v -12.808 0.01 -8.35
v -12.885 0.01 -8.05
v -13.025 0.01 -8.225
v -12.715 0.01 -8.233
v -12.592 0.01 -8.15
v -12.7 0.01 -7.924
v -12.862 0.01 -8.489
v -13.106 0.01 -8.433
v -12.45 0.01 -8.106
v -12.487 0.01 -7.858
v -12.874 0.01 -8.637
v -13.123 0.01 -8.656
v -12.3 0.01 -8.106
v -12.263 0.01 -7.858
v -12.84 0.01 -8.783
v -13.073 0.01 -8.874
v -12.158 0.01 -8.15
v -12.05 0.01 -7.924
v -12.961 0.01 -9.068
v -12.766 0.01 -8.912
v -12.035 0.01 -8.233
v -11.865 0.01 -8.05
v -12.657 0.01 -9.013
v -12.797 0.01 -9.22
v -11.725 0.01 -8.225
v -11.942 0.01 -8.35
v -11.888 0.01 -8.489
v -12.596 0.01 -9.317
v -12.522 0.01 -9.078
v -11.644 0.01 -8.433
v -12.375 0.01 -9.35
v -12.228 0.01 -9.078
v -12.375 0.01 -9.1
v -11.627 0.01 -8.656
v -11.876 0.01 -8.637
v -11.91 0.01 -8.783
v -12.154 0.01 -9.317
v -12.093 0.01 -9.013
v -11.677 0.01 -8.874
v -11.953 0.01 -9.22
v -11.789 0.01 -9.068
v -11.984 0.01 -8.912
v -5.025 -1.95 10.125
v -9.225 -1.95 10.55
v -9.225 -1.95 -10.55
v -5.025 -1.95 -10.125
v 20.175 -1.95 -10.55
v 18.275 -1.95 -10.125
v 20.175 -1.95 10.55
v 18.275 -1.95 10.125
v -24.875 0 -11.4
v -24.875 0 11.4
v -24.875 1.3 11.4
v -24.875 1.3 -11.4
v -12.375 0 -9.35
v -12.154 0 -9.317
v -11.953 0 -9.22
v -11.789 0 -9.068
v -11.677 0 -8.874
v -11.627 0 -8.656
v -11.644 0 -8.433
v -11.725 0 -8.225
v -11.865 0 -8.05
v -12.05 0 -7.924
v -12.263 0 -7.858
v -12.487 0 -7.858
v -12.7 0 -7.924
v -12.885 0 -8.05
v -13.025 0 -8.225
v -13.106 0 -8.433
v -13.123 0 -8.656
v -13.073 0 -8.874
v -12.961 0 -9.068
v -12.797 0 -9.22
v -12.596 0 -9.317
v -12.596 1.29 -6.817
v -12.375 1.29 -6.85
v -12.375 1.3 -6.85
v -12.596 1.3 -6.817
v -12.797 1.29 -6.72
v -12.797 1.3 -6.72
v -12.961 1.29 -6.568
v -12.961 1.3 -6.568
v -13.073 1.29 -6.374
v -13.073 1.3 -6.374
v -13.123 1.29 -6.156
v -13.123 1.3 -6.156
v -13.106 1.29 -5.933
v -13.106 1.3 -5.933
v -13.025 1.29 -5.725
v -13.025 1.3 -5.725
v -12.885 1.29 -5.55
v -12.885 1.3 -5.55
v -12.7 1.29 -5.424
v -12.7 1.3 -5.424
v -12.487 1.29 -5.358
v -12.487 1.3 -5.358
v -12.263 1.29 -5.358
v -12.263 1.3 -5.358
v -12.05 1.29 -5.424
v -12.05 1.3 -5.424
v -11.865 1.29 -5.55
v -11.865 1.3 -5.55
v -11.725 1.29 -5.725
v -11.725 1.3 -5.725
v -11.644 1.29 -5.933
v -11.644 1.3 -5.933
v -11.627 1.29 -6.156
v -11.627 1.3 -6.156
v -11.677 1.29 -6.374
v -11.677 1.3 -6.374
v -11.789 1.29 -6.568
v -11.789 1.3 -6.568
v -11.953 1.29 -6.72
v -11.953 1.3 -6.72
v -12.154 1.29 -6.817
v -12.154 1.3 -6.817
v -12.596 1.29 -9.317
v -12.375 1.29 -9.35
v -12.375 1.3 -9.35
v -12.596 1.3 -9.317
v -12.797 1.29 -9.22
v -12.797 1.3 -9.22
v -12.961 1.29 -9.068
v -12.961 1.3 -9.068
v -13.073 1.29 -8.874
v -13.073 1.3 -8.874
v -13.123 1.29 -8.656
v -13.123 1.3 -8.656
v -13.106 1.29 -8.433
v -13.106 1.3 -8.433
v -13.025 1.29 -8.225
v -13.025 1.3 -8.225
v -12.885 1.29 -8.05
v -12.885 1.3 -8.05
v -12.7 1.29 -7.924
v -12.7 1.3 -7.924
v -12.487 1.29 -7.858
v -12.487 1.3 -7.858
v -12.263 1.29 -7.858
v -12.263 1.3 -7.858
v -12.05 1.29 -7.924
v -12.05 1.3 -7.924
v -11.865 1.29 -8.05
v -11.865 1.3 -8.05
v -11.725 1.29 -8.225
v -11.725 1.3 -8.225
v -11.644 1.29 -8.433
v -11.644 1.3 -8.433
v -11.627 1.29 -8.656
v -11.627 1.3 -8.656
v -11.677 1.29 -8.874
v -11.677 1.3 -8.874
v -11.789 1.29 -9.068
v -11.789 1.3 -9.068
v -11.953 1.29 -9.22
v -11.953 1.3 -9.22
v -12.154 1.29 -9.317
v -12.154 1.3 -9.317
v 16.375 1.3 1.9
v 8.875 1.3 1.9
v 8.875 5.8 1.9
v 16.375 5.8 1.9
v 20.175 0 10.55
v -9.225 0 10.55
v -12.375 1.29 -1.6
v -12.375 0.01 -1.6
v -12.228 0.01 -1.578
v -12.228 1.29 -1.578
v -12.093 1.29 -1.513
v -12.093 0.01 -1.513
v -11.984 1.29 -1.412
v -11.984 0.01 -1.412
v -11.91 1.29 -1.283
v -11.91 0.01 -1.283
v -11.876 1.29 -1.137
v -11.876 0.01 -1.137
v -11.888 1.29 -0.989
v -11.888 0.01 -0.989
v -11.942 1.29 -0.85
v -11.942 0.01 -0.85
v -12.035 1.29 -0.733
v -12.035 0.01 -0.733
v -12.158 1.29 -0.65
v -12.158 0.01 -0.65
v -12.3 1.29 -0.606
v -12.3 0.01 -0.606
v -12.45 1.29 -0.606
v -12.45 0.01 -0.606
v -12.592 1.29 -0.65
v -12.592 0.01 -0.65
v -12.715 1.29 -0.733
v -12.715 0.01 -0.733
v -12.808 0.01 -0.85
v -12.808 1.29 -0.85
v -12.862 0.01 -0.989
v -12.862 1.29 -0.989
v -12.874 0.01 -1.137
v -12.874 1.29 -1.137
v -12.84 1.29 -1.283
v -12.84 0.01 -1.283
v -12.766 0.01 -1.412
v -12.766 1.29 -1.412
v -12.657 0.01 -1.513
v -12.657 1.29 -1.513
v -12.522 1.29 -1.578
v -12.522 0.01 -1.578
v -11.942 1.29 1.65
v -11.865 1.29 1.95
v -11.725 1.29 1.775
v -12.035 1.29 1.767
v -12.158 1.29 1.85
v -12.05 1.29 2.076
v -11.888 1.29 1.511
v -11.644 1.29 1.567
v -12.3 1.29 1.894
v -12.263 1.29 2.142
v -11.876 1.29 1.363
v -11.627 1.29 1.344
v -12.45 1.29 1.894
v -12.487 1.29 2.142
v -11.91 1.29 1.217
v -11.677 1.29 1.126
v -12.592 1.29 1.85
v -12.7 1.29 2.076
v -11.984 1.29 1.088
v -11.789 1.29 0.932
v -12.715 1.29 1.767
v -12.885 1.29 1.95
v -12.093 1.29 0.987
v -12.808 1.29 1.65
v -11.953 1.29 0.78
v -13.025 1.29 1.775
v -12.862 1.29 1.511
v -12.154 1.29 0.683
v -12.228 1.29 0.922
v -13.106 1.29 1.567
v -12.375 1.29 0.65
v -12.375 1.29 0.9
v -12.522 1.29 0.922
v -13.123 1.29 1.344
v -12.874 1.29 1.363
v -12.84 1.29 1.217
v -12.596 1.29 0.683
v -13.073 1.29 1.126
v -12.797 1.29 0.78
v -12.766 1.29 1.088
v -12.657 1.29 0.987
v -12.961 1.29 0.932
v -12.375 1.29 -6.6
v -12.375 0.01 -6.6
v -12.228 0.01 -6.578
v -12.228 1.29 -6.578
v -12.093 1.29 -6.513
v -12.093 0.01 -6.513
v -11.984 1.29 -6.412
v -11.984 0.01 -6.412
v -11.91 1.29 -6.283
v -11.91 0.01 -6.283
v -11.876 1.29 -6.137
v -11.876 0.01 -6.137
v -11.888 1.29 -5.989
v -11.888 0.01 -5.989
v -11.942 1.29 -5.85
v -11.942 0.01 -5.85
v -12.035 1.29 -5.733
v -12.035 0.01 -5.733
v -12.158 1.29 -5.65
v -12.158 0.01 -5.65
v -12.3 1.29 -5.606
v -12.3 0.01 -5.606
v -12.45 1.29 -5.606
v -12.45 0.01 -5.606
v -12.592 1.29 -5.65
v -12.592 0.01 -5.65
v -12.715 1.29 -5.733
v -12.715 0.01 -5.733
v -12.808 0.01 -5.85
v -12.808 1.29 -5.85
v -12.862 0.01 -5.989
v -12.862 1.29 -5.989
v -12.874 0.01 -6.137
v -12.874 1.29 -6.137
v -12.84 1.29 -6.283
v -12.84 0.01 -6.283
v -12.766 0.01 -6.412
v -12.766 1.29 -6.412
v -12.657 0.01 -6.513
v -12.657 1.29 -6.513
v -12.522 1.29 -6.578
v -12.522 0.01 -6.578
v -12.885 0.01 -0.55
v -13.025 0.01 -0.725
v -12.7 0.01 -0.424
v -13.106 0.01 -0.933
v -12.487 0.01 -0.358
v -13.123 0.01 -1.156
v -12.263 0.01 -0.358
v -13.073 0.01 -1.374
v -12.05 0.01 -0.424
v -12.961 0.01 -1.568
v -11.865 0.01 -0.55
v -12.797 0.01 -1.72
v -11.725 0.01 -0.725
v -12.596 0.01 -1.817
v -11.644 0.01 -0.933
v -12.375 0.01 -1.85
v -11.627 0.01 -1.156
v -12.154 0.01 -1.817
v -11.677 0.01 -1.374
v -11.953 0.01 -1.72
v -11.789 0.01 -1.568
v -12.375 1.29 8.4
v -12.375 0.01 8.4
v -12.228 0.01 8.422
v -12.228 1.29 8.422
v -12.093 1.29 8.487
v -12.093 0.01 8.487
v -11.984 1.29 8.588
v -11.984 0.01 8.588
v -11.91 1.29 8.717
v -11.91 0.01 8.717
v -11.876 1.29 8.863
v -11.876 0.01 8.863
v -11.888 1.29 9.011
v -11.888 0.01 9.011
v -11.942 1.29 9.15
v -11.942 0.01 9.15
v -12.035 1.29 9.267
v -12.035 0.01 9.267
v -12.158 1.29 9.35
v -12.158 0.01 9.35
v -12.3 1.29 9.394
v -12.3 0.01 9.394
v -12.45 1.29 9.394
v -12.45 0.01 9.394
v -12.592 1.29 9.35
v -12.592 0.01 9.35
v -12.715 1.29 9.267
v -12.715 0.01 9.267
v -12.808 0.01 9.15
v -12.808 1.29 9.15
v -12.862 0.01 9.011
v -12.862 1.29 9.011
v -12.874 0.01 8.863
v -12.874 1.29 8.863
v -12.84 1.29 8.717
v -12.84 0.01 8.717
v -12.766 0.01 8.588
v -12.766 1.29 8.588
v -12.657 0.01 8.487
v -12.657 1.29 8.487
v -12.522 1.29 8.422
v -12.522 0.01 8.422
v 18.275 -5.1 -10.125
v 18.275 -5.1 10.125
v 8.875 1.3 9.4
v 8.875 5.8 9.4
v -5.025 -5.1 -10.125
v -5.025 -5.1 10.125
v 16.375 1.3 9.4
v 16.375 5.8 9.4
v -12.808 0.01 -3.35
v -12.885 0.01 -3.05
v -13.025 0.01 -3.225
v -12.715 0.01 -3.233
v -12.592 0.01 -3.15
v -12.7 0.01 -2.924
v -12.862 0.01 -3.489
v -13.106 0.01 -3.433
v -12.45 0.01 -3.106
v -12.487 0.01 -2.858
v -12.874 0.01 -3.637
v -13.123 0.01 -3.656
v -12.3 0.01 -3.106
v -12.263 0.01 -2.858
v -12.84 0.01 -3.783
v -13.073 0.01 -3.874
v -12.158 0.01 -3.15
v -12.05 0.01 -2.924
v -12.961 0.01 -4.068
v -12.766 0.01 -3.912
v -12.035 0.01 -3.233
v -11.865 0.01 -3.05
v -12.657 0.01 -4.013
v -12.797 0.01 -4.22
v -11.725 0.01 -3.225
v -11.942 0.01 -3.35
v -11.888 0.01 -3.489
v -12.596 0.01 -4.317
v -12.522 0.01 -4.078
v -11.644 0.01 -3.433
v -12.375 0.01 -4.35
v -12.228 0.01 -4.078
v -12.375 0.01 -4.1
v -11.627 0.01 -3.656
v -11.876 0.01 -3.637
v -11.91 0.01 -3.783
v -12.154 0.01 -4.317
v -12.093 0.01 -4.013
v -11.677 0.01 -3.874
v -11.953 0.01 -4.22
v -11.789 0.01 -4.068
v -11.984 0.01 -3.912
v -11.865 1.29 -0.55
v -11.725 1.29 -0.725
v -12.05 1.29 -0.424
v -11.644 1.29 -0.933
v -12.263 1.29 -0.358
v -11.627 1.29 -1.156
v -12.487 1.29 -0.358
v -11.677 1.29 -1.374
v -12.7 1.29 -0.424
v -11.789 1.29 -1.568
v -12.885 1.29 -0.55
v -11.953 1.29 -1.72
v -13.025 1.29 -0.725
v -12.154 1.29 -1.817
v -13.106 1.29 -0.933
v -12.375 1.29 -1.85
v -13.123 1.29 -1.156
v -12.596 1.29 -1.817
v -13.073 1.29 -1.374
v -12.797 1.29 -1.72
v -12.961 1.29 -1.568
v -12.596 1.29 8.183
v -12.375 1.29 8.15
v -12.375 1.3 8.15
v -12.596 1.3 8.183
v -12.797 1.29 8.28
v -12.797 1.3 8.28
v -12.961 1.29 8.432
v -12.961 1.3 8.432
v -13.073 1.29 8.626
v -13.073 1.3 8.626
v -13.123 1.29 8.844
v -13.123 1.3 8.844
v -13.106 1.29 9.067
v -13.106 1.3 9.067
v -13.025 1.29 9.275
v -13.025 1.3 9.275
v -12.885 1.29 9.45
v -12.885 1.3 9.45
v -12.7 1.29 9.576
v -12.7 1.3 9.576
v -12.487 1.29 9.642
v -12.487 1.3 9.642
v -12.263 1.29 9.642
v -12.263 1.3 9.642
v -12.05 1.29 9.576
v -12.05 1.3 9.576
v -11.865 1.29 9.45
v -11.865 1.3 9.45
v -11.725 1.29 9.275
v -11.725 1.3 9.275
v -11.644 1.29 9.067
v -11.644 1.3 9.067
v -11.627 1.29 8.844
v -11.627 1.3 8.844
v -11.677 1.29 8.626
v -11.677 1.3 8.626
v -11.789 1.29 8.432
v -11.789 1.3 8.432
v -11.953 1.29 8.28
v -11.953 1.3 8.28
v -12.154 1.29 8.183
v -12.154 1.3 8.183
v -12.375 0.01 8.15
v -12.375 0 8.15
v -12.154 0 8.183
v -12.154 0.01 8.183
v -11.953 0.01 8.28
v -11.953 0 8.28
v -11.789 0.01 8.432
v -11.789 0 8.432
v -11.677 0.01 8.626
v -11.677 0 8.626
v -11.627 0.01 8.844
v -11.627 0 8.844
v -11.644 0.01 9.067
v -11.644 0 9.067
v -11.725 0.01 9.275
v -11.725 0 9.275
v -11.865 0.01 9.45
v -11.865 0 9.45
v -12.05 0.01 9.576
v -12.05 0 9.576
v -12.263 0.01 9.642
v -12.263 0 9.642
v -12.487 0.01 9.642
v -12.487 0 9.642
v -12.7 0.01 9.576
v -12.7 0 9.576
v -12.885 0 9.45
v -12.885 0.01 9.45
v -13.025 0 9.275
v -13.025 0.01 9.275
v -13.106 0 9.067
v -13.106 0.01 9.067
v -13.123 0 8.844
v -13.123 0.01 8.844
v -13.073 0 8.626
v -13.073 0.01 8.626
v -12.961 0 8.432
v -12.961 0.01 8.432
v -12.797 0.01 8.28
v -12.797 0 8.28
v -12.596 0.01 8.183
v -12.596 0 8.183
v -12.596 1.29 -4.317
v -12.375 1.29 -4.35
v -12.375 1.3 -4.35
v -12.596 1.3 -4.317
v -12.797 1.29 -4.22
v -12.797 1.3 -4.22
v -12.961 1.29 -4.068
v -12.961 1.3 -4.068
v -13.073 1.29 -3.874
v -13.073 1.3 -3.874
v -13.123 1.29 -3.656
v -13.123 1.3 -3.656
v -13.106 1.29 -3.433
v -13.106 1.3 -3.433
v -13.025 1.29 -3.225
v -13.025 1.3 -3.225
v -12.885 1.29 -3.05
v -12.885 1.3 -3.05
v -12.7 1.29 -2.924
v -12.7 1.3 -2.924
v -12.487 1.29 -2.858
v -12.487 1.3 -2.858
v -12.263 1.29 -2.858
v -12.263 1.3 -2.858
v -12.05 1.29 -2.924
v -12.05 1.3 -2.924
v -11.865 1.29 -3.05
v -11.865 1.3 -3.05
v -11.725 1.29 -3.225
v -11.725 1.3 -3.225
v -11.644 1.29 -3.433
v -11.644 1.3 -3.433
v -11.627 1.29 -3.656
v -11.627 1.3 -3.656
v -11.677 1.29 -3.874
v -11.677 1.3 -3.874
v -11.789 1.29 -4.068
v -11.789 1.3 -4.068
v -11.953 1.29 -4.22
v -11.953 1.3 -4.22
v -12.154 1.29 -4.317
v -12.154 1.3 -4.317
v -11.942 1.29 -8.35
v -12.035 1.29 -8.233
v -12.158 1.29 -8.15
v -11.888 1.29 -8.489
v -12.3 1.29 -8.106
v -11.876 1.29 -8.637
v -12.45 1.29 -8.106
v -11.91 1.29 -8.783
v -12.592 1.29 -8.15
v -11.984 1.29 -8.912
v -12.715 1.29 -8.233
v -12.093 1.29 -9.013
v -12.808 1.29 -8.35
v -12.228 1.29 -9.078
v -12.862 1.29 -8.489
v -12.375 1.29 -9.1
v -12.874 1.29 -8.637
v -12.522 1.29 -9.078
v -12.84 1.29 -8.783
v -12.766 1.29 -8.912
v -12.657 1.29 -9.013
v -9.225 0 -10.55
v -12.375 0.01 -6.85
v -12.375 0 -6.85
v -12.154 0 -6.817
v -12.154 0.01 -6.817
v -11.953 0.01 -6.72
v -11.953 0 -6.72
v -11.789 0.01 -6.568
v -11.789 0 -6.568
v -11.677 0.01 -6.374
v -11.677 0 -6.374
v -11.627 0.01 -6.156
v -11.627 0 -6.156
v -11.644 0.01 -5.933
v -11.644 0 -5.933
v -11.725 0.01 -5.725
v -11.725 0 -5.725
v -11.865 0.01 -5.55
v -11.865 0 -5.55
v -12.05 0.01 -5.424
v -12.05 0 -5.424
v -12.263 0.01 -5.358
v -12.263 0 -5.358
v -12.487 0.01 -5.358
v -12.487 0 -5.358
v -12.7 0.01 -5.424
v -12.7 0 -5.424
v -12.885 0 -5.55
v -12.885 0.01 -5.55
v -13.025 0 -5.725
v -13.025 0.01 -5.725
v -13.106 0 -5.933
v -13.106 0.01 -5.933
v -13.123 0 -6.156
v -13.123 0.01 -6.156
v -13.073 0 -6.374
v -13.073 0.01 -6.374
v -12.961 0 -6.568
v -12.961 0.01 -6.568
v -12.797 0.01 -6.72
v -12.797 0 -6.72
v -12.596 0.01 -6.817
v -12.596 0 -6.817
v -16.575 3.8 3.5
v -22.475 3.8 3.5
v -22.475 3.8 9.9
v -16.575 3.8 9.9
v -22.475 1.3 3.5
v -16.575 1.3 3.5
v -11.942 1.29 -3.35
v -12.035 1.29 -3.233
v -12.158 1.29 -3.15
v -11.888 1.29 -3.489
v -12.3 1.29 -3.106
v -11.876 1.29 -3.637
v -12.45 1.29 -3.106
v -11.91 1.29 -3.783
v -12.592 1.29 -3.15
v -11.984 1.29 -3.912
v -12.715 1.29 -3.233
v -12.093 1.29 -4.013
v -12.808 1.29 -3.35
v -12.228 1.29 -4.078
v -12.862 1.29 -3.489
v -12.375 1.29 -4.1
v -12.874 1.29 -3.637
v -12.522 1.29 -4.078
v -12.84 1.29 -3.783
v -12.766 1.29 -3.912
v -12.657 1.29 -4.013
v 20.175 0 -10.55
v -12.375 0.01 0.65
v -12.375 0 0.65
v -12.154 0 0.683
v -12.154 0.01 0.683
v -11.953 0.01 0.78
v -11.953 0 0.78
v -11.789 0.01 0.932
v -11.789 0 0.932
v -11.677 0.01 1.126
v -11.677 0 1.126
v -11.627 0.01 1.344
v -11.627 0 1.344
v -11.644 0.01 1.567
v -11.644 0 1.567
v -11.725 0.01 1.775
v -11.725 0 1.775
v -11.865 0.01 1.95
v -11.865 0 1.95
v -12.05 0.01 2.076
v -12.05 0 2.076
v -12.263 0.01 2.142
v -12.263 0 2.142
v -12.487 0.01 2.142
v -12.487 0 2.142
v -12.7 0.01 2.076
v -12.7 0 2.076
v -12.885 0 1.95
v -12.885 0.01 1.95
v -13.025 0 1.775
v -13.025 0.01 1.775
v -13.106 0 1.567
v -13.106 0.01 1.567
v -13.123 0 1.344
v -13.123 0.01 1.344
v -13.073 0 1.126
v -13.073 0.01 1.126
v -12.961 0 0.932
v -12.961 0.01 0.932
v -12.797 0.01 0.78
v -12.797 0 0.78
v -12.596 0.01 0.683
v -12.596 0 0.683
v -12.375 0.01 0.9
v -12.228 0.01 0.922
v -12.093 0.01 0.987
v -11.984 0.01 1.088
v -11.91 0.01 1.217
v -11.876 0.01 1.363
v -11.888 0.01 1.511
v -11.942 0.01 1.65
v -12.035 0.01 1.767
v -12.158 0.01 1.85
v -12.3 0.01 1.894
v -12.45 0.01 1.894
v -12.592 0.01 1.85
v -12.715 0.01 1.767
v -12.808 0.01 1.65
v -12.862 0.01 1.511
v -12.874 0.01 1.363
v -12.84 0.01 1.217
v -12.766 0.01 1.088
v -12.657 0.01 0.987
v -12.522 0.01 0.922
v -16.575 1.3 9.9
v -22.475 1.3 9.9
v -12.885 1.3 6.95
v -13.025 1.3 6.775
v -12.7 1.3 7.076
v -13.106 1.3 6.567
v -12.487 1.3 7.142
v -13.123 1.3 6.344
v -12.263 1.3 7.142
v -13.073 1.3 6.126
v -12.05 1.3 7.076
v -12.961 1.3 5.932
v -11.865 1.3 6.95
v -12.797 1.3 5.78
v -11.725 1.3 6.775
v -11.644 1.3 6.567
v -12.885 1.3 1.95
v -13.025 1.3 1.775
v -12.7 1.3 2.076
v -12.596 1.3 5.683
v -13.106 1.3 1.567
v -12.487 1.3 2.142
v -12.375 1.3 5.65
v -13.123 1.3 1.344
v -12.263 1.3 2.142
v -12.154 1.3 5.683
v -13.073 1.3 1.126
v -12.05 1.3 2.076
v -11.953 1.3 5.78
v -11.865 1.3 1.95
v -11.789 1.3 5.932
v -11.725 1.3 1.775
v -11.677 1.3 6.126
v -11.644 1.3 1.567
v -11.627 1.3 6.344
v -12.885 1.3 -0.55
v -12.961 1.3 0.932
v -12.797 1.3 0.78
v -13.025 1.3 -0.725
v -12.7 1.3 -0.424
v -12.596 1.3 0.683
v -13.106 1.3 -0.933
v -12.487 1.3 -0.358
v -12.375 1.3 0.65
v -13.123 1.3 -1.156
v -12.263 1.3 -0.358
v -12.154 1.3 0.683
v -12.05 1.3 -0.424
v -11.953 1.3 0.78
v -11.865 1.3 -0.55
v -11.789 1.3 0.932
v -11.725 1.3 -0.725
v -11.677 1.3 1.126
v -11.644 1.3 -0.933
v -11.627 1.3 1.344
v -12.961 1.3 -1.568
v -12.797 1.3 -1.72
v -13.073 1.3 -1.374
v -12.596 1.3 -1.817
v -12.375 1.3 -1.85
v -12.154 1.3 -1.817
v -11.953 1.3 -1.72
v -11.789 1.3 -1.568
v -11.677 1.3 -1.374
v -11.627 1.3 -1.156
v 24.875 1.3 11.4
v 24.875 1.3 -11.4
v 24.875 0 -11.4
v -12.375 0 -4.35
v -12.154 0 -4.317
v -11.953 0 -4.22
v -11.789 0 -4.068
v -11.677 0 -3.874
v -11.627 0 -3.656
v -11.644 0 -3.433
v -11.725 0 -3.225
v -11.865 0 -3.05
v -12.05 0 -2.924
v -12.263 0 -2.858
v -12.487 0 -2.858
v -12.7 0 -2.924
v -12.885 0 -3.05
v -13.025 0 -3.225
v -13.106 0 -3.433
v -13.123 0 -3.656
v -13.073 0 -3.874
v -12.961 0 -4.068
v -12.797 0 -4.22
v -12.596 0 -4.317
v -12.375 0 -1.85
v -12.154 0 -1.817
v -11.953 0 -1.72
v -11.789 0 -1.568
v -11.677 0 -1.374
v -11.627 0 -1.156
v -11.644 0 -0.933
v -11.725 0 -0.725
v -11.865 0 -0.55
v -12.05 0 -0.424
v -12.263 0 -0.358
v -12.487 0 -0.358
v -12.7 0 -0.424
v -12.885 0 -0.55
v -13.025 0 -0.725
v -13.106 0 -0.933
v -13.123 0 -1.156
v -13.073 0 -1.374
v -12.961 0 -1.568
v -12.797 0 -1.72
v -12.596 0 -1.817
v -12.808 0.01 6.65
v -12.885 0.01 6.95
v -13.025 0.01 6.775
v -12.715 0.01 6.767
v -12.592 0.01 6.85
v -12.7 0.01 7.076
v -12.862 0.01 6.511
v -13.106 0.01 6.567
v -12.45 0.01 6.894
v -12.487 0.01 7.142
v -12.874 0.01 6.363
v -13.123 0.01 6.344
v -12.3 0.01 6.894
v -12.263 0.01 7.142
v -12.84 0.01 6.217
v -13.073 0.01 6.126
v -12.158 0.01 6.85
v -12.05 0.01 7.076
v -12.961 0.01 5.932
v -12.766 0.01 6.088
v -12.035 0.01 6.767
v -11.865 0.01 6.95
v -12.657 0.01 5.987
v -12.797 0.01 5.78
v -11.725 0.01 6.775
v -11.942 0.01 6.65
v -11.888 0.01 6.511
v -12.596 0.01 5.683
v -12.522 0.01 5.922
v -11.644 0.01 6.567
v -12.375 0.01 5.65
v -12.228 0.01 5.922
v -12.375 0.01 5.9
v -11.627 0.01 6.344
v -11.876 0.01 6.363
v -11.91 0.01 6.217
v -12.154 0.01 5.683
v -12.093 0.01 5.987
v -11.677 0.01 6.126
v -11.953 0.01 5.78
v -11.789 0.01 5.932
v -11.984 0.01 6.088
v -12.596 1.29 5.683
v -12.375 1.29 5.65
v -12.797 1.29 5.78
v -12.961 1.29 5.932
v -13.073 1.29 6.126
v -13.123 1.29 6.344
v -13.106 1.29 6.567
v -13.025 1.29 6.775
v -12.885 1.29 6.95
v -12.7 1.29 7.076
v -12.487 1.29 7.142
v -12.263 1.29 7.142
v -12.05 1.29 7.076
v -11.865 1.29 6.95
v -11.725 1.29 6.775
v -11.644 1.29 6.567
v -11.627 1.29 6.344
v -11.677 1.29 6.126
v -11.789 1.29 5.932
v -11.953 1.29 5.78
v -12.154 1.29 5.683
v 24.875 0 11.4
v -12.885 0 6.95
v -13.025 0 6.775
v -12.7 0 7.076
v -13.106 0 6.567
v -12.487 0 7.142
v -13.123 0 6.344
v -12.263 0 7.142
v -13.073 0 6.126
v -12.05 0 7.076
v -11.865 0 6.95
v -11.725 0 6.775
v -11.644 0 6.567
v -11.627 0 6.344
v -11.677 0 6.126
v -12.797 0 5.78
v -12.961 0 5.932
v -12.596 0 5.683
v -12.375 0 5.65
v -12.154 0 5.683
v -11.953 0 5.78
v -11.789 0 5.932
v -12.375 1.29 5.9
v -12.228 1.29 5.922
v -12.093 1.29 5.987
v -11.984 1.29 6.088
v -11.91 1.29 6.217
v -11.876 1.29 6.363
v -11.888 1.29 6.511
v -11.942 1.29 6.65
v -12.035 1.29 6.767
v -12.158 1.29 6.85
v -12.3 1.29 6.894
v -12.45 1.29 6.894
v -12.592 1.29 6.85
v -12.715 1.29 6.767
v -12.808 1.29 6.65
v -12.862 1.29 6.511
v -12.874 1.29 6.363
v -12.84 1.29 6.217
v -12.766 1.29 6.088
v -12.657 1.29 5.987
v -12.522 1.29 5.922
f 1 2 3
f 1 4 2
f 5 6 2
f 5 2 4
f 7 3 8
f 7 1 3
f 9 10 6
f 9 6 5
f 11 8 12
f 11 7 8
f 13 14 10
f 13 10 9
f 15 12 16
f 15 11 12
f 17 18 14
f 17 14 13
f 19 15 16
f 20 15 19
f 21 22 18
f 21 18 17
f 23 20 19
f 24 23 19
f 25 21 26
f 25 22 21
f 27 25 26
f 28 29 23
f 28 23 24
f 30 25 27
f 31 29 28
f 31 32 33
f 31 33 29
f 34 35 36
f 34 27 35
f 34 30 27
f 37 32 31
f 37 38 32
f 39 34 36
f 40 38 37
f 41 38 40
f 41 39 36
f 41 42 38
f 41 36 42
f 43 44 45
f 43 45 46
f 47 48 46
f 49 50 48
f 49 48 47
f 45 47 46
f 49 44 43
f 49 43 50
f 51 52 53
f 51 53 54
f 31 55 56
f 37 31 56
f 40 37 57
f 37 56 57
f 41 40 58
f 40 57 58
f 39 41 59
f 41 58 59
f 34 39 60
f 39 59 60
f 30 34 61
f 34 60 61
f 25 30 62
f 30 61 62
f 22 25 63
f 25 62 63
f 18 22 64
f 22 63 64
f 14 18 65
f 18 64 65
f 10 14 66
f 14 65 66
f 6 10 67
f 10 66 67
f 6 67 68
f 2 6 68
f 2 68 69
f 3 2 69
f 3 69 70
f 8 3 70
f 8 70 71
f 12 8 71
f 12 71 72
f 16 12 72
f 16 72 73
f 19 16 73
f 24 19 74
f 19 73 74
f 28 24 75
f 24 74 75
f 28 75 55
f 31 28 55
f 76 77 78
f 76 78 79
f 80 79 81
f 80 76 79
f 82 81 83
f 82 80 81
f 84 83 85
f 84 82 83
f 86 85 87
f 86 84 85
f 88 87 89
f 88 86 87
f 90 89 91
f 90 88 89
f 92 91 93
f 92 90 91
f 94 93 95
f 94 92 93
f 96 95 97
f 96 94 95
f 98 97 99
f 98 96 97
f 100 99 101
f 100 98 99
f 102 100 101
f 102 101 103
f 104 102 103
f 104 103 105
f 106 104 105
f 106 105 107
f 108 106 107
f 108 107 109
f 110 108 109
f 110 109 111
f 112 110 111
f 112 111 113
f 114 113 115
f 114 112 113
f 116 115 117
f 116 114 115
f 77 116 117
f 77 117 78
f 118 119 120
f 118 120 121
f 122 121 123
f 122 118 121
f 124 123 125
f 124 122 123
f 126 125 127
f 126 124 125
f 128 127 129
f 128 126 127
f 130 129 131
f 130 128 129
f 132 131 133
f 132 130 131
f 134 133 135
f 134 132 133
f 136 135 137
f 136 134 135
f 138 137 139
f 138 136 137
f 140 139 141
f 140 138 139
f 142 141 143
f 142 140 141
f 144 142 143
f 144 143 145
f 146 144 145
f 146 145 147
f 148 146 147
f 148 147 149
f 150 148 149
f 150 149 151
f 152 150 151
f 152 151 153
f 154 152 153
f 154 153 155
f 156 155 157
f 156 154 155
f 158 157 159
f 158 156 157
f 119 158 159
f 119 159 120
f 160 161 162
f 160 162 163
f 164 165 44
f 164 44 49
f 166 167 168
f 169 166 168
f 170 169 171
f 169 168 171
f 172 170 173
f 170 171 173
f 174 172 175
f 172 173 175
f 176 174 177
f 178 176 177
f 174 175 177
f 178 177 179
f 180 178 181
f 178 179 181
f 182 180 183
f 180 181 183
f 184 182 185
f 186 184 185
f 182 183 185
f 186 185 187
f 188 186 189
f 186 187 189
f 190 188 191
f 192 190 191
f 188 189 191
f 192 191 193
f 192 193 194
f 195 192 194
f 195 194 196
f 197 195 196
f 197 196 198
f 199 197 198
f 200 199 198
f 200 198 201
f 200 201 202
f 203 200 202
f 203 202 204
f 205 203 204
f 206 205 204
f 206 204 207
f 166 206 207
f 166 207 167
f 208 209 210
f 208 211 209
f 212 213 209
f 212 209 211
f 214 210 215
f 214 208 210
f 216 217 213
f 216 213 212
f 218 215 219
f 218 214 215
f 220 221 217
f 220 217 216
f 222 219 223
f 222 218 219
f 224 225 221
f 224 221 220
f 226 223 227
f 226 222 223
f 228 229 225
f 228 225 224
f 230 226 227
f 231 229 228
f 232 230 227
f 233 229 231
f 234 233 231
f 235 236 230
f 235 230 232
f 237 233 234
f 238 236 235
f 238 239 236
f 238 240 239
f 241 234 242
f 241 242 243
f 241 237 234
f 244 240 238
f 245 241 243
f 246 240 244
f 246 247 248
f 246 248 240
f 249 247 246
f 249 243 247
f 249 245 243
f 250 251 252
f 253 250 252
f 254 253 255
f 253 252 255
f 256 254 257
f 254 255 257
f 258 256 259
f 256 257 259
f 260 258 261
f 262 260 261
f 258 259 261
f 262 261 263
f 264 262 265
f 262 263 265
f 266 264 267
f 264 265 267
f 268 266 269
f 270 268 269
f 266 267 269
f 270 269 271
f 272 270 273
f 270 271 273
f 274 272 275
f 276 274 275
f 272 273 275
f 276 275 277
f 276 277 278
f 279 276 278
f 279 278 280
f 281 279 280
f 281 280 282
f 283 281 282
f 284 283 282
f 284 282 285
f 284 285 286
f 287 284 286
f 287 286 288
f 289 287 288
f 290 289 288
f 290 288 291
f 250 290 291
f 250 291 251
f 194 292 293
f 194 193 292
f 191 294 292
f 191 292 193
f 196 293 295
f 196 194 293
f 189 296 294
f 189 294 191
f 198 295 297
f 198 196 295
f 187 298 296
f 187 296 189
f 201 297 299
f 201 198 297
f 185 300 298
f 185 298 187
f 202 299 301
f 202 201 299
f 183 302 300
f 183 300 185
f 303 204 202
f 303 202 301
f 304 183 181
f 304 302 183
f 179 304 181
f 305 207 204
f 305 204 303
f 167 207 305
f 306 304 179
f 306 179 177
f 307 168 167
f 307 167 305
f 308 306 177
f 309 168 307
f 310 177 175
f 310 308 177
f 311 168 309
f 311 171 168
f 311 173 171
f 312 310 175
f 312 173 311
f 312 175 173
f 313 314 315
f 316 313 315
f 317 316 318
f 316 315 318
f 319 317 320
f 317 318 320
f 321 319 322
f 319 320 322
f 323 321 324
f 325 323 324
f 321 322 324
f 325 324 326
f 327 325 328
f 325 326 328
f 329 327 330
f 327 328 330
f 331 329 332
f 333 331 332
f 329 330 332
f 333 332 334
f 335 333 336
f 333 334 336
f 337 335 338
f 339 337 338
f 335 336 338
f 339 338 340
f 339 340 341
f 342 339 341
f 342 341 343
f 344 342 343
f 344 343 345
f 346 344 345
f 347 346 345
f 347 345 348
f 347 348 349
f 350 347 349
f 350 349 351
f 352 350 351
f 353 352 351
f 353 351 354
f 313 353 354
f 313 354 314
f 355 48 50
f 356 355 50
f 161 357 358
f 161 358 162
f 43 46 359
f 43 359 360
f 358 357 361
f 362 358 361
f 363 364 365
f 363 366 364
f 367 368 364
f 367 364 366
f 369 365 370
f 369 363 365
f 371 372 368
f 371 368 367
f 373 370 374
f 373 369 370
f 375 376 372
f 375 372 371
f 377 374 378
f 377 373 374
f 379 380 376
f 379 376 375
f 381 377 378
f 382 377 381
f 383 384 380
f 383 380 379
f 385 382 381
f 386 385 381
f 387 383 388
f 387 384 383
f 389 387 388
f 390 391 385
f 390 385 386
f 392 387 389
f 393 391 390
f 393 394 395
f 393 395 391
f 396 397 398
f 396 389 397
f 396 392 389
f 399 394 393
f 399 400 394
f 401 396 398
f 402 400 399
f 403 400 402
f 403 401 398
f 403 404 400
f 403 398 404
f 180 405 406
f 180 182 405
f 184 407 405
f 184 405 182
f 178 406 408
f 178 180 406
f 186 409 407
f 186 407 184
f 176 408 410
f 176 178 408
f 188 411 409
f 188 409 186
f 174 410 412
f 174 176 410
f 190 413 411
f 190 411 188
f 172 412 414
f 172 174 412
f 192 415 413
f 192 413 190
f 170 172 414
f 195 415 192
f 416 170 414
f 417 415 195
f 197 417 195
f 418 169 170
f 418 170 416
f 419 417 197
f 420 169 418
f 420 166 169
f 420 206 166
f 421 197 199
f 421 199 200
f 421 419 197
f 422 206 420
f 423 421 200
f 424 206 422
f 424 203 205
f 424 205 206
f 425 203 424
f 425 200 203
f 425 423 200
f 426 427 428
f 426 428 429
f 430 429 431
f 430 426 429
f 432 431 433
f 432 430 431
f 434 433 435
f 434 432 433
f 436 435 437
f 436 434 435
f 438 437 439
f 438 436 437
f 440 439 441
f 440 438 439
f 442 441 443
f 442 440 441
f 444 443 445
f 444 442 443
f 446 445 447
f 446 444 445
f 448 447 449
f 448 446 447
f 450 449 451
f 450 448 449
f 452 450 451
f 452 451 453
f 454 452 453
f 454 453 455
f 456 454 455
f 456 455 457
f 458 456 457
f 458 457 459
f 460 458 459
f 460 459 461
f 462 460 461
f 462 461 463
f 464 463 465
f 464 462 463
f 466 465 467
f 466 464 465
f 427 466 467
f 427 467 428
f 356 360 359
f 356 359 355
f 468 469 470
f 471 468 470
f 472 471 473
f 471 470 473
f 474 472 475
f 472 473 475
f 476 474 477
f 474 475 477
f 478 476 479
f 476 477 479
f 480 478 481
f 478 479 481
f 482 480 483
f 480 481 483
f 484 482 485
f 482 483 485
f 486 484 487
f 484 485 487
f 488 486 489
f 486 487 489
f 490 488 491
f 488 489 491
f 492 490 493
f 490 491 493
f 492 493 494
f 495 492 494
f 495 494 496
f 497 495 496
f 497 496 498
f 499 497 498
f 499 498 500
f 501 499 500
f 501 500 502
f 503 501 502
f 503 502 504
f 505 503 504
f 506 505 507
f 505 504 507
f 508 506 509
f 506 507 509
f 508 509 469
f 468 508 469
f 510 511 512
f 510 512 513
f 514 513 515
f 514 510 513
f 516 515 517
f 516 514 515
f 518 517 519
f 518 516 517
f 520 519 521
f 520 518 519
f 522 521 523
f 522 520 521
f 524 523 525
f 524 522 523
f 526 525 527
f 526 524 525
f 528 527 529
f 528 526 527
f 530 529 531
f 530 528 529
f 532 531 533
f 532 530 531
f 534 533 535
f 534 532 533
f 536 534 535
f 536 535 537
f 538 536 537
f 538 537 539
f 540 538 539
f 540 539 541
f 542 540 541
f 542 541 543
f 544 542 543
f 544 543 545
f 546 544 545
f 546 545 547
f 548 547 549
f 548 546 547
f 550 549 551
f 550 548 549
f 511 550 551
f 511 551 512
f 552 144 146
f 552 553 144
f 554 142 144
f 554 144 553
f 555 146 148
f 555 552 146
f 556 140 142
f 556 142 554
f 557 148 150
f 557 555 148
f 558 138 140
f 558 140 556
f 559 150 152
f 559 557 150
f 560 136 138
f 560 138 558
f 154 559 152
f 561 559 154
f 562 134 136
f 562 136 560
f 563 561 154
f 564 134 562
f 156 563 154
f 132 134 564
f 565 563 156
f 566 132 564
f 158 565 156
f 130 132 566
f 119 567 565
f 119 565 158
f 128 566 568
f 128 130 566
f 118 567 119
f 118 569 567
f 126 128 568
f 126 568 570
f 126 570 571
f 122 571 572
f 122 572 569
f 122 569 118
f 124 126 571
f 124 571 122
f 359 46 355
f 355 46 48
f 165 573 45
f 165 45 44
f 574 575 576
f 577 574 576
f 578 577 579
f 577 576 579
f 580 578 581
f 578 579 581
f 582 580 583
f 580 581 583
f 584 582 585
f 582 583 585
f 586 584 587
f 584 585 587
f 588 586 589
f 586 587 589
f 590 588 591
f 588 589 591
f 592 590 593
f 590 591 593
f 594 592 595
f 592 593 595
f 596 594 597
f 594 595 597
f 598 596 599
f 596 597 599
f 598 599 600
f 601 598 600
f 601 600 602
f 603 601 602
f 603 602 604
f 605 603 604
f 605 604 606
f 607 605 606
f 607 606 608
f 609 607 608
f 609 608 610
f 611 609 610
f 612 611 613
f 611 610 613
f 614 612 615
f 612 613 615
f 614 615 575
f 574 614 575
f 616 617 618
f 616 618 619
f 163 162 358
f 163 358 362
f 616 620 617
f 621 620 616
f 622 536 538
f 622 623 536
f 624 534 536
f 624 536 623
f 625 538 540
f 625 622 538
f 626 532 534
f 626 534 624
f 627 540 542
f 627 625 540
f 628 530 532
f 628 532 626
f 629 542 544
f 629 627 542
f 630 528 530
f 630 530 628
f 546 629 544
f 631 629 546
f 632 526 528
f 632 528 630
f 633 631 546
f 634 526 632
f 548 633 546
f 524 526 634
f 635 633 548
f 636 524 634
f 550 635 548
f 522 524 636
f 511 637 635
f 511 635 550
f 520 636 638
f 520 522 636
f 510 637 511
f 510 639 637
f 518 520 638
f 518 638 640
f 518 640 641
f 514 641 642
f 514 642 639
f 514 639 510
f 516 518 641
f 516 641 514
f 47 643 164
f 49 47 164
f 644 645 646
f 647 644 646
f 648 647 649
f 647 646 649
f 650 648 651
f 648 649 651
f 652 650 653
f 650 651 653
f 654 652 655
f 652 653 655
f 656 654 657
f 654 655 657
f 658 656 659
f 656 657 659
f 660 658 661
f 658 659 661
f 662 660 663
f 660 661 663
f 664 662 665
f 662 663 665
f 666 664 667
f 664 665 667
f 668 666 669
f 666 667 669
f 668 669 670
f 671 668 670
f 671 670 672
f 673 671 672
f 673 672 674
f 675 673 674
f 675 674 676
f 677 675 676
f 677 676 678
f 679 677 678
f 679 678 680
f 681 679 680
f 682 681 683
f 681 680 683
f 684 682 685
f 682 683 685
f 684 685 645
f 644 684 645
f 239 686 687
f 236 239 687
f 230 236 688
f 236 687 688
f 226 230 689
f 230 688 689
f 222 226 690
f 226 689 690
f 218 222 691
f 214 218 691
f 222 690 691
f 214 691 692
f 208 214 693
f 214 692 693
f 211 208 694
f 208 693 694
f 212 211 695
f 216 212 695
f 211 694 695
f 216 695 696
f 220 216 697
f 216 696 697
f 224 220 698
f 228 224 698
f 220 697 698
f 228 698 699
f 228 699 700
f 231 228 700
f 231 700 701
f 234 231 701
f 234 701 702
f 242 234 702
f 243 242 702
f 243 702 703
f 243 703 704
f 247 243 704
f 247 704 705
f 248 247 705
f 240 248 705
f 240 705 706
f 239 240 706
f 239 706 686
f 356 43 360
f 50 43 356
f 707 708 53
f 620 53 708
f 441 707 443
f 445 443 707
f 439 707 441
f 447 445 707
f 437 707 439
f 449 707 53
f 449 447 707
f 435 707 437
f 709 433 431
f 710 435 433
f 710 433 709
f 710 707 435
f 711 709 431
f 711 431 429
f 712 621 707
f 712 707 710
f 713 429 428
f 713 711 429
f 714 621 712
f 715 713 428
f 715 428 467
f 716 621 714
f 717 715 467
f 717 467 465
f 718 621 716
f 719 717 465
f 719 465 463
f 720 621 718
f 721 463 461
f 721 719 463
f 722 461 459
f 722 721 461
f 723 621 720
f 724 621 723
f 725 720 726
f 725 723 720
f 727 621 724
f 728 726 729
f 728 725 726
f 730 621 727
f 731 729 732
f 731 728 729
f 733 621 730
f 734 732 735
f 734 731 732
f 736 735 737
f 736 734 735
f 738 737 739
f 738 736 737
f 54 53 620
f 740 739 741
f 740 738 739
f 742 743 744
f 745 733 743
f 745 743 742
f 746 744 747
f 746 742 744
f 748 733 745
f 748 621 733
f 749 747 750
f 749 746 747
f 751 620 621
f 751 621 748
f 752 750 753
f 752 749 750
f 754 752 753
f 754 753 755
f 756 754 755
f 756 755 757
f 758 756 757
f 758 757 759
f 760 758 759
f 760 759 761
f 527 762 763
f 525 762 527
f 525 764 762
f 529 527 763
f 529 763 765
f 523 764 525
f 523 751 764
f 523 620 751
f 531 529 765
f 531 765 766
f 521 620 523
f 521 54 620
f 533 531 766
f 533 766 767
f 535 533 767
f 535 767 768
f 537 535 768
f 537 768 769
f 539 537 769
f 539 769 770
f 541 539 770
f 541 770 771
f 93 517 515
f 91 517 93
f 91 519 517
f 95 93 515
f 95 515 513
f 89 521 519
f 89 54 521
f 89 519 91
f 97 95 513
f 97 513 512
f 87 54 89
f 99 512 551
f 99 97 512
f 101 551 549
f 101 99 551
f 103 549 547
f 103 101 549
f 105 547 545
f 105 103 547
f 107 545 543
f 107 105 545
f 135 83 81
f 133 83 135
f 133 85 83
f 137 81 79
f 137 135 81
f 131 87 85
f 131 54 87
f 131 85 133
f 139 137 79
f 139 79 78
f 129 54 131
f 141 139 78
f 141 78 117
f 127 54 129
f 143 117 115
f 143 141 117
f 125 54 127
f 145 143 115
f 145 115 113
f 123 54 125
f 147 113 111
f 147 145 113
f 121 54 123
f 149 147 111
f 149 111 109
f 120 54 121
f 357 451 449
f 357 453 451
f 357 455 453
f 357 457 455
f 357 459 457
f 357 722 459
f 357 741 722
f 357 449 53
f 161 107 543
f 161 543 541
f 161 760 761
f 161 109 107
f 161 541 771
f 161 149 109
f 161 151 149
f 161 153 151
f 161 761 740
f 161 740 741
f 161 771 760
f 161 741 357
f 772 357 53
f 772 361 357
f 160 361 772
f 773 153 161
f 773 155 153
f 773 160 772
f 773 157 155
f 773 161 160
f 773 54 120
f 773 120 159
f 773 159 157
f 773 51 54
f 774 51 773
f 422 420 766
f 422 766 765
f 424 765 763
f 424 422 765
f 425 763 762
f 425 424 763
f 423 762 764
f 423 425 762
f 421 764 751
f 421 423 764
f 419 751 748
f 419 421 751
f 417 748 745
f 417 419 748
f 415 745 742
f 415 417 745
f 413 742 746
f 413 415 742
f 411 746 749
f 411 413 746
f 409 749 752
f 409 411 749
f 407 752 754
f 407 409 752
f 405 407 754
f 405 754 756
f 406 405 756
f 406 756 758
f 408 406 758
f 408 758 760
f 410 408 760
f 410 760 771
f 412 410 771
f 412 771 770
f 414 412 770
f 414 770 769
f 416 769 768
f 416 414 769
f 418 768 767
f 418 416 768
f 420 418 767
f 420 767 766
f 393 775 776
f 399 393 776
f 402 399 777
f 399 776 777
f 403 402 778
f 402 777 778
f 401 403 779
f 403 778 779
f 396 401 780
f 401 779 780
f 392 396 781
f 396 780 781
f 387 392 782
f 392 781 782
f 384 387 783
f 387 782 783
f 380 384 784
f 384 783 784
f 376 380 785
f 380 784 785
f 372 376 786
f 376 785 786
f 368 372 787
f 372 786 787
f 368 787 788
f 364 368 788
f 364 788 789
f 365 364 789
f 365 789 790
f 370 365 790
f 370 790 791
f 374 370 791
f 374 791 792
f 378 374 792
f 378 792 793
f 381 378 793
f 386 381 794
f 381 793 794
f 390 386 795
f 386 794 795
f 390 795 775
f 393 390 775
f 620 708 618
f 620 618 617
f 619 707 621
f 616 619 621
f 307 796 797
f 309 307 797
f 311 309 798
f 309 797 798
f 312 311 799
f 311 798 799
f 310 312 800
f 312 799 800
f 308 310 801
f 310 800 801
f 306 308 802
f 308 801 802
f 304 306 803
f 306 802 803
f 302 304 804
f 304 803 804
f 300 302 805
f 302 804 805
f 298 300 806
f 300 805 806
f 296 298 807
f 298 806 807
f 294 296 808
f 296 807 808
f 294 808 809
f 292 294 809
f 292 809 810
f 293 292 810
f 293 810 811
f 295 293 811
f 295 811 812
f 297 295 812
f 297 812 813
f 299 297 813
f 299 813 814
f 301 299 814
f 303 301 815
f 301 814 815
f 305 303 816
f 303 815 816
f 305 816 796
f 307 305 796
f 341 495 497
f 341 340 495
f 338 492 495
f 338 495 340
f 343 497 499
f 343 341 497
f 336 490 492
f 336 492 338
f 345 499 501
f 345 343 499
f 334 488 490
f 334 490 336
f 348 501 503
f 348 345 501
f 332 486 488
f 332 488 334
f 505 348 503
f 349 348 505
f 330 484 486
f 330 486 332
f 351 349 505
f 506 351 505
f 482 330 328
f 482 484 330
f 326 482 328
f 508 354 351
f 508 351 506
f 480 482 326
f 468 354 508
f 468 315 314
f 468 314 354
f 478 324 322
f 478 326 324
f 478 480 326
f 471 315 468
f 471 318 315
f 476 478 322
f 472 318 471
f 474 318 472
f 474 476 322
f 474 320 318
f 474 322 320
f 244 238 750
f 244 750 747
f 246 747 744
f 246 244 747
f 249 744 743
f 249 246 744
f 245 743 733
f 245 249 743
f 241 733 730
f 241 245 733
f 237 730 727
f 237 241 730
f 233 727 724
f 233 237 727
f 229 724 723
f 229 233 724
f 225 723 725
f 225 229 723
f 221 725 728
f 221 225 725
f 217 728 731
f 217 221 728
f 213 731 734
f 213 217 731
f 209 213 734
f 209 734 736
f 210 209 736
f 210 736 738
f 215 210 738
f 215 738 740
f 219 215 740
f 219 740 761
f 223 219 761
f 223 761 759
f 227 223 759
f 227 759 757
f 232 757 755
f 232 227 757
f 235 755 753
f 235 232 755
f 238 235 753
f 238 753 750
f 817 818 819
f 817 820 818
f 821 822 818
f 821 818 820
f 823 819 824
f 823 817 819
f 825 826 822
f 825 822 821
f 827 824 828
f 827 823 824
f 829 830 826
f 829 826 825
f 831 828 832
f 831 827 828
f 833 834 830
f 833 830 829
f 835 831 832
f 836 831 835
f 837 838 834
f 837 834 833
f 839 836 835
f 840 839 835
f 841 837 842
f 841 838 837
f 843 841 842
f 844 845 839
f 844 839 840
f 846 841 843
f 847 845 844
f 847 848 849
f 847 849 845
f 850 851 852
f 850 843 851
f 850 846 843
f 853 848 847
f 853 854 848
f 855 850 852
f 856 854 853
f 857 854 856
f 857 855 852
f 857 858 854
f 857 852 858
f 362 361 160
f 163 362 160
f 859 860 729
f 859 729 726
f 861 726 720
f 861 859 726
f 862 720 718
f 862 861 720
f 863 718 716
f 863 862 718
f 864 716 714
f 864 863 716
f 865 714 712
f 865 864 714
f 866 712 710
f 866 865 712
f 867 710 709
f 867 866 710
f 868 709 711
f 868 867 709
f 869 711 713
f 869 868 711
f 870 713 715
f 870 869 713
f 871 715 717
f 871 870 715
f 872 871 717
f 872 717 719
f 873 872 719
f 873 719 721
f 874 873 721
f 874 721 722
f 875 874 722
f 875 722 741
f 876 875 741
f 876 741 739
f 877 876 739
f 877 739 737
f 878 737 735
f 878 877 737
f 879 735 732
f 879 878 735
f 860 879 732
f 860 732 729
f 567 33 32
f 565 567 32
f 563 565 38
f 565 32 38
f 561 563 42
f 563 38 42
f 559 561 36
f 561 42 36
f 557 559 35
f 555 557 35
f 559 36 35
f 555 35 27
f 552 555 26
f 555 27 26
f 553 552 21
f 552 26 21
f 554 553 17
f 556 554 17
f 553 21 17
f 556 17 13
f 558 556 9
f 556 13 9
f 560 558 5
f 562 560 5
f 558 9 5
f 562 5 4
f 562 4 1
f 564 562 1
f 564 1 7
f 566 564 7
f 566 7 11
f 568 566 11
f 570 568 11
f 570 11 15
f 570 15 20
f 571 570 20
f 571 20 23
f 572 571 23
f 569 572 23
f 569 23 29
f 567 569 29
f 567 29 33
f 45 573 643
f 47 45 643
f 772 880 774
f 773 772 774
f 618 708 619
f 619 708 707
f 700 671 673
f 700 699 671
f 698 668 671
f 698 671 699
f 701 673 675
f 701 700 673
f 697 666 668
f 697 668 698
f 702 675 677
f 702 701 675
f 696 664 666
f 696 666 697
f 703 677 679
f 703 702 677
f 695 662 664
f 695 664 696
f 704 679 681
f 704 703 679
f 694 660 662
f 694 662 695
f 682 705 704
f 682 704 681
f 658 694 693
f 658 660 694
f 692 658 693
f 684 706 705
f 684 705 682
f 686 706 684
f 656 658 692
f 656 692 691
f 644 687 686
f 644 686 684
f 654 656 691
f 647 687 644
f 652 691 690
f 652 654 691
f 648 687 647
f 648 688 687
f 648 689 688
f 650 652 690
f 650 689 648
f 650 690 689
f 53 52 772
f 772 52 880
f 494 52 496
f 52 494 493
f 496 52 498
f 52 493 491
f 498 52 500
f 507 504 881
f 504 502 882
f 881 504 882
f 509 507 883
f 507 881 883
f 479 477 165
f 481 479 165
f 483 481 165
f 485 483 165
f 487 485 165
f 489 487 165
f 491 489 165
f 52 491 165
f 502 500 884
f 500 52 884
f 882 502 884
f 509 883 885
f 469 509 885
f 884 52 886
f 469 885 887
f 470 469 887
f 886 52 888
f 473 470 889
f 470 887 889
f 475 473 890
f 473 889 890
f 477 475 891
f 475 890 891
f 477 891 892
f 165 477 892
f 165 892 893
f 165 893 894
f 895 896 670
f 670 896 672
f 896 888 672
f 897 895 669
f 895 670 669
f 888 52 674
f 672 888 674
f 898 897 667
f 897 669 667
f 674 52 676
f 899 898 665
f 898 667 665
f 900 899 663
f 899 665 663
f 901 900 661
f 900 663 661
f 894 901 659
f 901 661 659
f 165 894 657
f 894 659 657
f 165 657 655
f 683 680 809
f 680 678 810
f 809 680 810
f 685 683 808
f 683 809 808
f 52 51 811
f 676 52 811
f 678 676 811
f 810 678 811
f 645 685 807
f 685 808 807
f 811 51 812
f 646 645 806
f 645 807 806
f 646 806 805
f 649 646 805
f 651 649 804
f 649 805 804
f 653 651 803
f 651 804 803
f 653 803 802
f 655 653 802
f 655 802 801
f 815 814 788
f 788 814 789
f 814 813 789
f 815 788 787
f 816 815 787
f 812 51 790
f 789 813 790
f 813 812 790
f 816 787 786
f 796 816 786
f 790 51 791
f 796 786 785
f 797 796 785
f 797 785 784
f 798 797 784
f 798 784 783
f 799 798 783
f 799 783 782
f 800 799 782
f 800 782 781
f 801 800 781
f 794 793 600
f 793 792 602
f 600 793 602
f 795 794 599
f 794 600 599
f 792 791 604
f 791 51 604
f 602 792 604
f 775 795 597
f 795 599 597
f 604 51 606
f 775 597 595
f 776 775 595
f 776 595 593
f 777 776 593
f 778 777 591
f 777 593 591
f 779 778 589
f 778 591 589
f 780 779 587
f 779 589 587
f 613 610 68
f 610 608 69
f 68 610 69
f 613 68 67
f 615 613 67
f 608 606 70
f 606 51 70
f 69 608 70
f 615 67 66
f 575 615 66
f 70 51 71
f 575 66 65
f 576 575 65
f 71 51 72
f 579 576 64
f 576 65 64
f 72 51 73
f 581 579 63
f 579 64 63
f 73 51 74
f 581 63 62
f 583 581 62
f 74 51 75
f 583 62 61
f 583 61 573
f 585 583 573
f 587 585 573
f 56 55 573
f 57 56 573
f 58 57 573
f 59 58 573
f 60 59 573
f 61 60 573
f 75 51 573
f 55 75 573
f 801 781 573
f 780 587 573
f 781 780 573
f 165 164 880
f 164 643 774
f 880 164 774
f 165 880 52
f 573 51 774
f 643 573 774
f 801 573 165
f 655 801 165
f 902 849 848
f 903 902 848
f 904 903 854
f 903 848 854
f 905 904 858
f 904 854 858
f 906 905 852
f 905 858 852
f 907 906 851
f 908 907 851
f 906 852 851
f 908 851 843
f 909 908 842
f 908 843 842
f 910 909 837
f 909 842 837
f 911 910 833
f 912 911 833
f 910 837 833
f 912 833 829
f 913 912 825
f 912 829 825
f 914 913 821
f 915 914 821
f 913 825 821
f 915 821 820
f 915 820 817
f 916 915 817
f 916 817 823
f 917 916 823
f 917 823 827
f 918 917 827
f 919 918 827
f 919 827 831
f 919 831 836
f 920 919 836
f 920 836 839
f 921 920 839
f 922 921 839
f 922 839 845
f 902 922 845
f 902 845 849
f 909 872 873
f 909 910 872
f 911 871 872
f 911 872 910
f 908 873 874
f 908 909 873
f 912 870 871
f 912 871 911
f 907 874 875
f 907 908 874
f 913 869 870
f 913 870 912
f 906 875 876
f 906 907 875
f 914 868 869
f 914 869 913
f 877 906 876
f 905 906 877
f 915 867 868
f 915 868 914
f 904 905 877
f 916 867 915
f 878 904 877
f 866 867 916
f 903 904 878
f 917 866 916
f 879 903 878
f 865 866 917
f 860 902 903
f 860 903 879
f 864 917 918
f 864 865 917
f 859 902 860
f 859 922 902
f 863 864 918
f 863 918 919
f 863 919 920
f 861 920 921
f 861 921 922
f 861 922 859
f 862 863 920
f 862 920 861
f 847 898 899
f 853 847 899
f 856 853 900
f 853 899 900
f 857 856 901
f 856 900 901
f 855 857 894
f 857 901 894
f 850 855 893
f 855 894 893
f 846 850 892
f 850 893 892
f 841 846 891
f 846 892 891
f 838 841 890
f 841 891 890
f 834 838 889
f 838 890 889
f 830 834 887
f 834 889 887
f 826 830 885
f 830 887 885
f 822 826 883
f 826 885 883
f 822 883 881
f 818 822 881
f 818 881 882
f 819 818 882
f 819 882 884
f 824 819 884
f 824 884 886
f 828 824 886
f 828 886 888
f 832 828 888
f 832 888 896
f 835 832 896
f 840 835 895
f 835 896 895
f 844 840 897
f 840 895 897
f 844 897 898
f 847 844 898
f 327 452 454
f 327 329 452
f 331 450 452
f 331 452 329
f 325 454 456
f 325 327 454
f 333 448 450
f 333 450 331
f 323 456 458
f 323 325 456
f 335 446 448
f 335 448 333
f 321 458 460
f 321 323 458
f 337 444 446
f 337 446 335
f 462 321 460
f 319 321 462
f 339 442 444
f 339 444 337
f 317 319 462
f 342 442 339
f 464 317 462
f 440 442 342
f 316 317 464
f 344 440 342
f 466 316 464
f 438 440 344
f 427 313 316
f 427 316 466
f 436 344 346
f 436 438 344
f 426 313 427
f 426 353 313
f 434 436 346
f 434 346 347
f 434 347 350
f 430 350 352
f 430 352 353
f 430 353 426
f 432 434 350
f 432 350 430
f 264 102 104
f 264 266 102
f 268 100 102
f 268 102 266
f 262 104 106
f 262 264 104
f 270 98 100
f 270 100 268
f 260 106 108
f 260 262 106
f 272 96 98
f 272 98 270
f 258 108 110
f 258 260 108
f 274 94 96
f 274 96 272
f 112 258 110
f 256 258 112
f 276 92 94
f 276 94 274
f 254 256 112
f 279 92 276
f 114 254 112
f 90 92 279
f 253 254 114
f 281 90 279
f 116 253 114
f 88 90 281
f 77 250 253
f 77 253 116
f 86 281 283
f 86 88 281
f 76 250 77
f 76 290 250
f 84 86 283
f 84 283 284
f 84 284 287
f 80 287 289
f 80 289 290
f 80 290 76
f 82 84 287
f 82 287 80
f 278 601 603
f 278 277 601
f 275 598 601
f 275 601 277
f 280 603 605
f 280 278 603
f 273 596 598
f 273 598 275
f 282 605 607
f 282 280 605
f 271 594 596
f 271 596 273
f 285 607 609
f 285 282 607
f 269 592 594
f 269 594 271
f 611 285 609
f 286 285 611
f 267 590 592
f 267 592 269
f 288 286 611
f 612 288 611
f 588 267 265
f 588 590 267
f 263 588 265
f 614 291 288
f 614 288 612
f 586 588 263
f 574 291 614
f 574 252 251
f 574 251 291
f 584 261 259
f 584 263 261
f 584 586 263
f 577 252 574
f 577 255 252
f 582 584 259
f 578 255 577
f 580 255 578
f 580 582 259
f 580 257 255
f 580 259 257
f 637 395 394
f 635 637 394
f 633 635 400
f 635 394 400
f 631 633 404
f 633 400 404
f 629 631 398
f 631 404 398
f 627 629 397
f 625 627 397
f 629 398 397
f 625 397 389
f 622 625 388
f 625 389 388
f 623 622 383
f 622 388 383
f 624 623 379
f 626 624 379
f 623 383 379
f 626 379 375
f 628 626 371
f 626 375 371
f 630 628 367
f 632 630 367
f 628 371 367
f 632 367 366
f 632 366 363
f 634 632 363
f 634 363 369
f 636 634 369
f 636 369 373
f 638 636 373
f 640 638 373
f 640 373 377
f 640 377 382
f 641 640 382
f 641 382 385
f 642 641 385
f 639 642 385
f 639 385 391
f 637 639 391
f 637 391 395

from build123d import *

# Parameters (mm, degrees)
SKETCH1_W           = 49.75
SKETCH1_H           = 22.8
BOSS_EXTRUDE1_DEPTH = 1.3
SKETCH2_W           = 7.5
SKETCH2_H           = 7.5
BOSS_EXTRUDE2_DEPTH = 4.5
SKETCH3_W           = 5.9
SKETCH3_H           = 6.4
BOSS_EXTRUDE3_DEPTH = 2.5
SKETCH4_W           = 29.4
SKETCH4_H           = 21.1
BOSS_EXTRUDE4_DEPTH = 1.95
SKETCH5_W           = 23.3
SKETCH5_H           = 20.25
BOSS_EXTRUDE5_DEPTH = 3.15
CUT_EXTRUDE1_REACH  = 29.971
SKETCH6_R           = 0.5
SKETCH7_R           = 0.75
CUT_EXTRUDE2_DEPTH  = 0.01
CUT_EXTRUDE3_START  = -0.01
SKETCH8_R           = 0.75
CUT_EXTRUDE3_DEPTH  = 0.01


with BuildPart() as part:
    # Sketch1 → Boss-Extrude1 (new body)
    with BuildSketch(Plane(origin=(0, 0, 0), x_dir=(1, 0, 0), z_dir=(0, 1, 0))):
        Rectangle(SKETCH1_W, SKETCH1_H)
    extrude(amount=BOSS_EXTRUDE1_DEPTH)

    # Sketch2 → Boss-Extrude2 (add)
    with BuildSketch(Plane(origin=(0, 1.3, 0), x_dir=(1, 0, 0), z_dir=(0, 1, 0))):
        with Locations((12.625, -5.65)):
            Rectangle(SKETCH2_W, SKETCH2_H)
    extrude(amount=BOSS_EXTRUDE2_DEPTH)

    # Sketch3 → Boss-Extrude3 (add)
    with BuildSketch(Plane(origin=(0, 1.3, 0), x_dir=(1, 0, 0), z_dir=(0, 1, 0))):
        with Locations((-19.525, -6.7)):
            Rectangle(SKETCH3_W, SKETCH3_H)
    extrude(amount=BOSS_EXTRUDE3_DEPTH)

    # Sketch4 → Boss-Extrude4 (add)
    with BuildSketch(Plane.XZ):
        with Locations((5.475, 0)):
            Rectangle(SKETCH4_W, SKETCH4_H)
    extrude(amount=BOSS_EXTRUDE4_DEPTH)

    # Sketch5 → Boss-Extrude5 (add)
    with BuildSketch(Plane.XZ.offset(1.95)):
        with Locations((6.625, 0)):
            Rectangle(SKETCH5_W, SKETCH5_H)
    extrude(amount=BOSS_EXTRUDE5_DEPTH)

    # Sketch6 → Cut-Extrude1 (cut, up to next)
    with BuildSketch(Plane.XZ, mode=Mode.PRIVATE) as cut_extrude1_sk1:
        with Locations(Location((-12.375, 8.9, 0), (0, 0, 270))):
            Circle(SKETCH6_R)
    cut_extrude1_tool1 = extrude(cut_extrude1_sk1.sketch, amount=-CUT_EXTRUDE1_REACH, mode=Mode.PRIVATE) & part.part
    # Sketch6 → Cut-Extrude1 (cut, up to next)
    with BuildSketch(Plane.XZ, mode=Mode.PRIVATE) as cut_extrude1_sk2:
        with Locations(Location((-12.375, 6.4, 0), (0, 0, 270))):
            Circle(SKETCH6_R)
    cut_extrude1_tool2 = extrude(cut_extrude1_sk2.sketch, amount=-CUT_EXTRUDE1_REACH, mode=Mode.PRIVATE) & part.part
    # Sketch6 → Cut-Extrude1 (cut, up to next)
    with BuildSketch(Plane.XZ, mode=Mode.PRIVATE) as cut_extrude1_sk3:
        with Locations(Location((-12.375, 1.4, 0), (0, 0, 270))):
            Circle(SKETCH6_R)
    cut_extrude1_tool3 = extrude(cut_extrude1_sk3.sketch, amount=-CUT_EXTRUDE1_REACH, mode=Mode.PRIVATE) & part.part
    # Sketch6 → Cut-Extrude1 (cut, up to next)
    with BuildSketch(Plane.XZ, mode=Mode.PRIVATE) as cut_extrude1_sk4:
        with Locations(Location((-12.375, -1.1, 0), (0, 0, 270))):
            Circle(SKETCH6_R)
    cut_extrude1_tool4 = extrude(cut_extrude1_sk4.sketch, amount=-CUT_EXTRUDE1_REACH, mode=Mode.PRIVATE) & part.part
    # Sketch6 → Cut-Extrude1 (cut, up to next)
    with BuildSketch(Plane.XZ, mode=Mode.PRIVATE) as cut_extrude1_sk5:
        with Locations(Location((-12.375, -3.6, 0), (0, 0, 270))):
            Circle(SKETCH6_R)
    cut_extrude1_tool5 = extrude(cut_extrude1_sk5.sketch, amount=-CUT_EXTRUDE1_REACH, mode=Mode.PRIVATE) & part.part
    # Sketch6 → Cut-Extrude1 (cut, up to next)
    with BuildSketch(Plane.XZ, mode=Mode.PRIVATE) as cut_extrude1_sk6:
        with Locations(Location((-12.375, -6.1, 0), (0, 0, 270))):
            Circle(SKETCH6_R)
    cut_extrude1_tool6 = extrude(cut_extrude1_sk6.sketch, amount=-CUT_EXTRUDE1_REACH, mode=Mode.PRIVATE) & part.part
    # Sketch6 → Cut-Extrude1 (cut, up to next)
    with BuildSketch(Plane.XZ, mode=Mode.PRIVATE) as cut_extrude1_sk7:
        with Locations(Location((-12.375, -8.6, 0), (0, 0, 270))):
            Circle(SKETCH6_R)
    cut_extrude1_tool7 = extrude(cut_extrude1_sk7.sketch, amount=-CUT_EXTRUDE1_REACH, mode=Mode.PRIVATE) & part.part
    add(cut_extrude1_tool1.solids().sort_by_distance((-12.375, 0, 8.9))[0], mode=Mode.SUBTRACT)
    add(cut_extrude1_tool2.solids().sort_by_distance((-12.375, 0, 6.4))[0], mode=Mode.SUBTRACT)
    add(cut_extrude1_tool3.solids().sort_by_distance((-12.375, 0, 1.4))[0], mode=Mode.SUBTRACT)
    add(cut_extrude1_tool4.solids().sort_by_distance((-12.375, 0, -1.1))[0], mode=Mode.SUBTRACT)
    add(cut_extrude1_tool5.solids().sort_by_distance((-12.375, 0, -3.6))[0], mode=Mode.SUBTRACT)
    add(cut_extrude1_tool6.solids().sort_by_distance((-12.375, 0, -6.1))[0], mode=Mode.SUBTRACT)
    add(cut_extrude1_tool7.solids().sort_by_distance((-12.375, 0, -8.6))[0], mode=Mode.SUBTRACT)

    # Sketch7 → Cut-Extrude2 (cut)
    with BuildSketch(Plane.XZ):
        with Locations(Location((-12.375, 8.9, 0), (0, 0, 270))):
            Circle(SKETCH7_R)
        with Locations(Location((-12.375, 6.4, 0), (0, 0, 270))):
            Circle(SKETCH7_R)
        with Locations(Location((-12.375, 1.4, 0), (0, 0, 270))):
            Circle(SKETCH7_R)
        with Locations(Location((-12.375, -1.1, 0), (0, 0, 270))):
            Circle(SKETCH7_R)
        with Locations(Location((-12.375, -3.6, 0), (0, 0, 270))):
            Circle(SKETCH7_R)
        with Locations(Location((-12.375, -6.1, 0), (0, 0, 270))):
            Circle(SKETCH7_R)
        with Locations(Location((-12.375, -8.6, 0), (0, 0, 270))):
            Circle(SKETCH7_R)
    extrude(amount=-CUT_EXTRUDE2_DEPTH, mode=Mode.SUBTRACT)

    # Sketch8 → Cut-Extrude3 (cut)
    with BuildSketch(Plane(origin=(0, 1.3, 0), x_dir=(1, 0, 0), z_dir=(0, 1, 0)).offset(CUT_EXTRUDE3_START)):
        with Locations(Location((-12.375, 8.6, 0), (0, 0, 90))):
            Circle(SKETCH8_R)
        with Locations(Location((-12.375, 6.1, 0), (0, 0, 90))):
            Circle(SKETCH8_R)
        with Locations(Location((-12.375, 3.6, 0), (0, 0, 90))):
            Circle(SKETCH8_R)
        with Locations(Location((-12.375, 1.1, 0), (0, 0, 90))):
            Circle(SKETCH8_R)
        with Locations(Location((-12.375, -1.4, 0), (0, 0, 90))):
            Circle(SKETCH8_R)
        with Locations(Location((-12.375, -6.4, 0), (0, 0, 90))):
            Circle(SKETCH8_R)
        with Locations(Location((-12.375, -8.9, 0), (0, 0, 90))):
            Circle(SKETCH8_R)
    extrude(amount=CUT_EXTRUDE3_DEPTH, mode=Mode.SUBTRACT)


solid = part.part
